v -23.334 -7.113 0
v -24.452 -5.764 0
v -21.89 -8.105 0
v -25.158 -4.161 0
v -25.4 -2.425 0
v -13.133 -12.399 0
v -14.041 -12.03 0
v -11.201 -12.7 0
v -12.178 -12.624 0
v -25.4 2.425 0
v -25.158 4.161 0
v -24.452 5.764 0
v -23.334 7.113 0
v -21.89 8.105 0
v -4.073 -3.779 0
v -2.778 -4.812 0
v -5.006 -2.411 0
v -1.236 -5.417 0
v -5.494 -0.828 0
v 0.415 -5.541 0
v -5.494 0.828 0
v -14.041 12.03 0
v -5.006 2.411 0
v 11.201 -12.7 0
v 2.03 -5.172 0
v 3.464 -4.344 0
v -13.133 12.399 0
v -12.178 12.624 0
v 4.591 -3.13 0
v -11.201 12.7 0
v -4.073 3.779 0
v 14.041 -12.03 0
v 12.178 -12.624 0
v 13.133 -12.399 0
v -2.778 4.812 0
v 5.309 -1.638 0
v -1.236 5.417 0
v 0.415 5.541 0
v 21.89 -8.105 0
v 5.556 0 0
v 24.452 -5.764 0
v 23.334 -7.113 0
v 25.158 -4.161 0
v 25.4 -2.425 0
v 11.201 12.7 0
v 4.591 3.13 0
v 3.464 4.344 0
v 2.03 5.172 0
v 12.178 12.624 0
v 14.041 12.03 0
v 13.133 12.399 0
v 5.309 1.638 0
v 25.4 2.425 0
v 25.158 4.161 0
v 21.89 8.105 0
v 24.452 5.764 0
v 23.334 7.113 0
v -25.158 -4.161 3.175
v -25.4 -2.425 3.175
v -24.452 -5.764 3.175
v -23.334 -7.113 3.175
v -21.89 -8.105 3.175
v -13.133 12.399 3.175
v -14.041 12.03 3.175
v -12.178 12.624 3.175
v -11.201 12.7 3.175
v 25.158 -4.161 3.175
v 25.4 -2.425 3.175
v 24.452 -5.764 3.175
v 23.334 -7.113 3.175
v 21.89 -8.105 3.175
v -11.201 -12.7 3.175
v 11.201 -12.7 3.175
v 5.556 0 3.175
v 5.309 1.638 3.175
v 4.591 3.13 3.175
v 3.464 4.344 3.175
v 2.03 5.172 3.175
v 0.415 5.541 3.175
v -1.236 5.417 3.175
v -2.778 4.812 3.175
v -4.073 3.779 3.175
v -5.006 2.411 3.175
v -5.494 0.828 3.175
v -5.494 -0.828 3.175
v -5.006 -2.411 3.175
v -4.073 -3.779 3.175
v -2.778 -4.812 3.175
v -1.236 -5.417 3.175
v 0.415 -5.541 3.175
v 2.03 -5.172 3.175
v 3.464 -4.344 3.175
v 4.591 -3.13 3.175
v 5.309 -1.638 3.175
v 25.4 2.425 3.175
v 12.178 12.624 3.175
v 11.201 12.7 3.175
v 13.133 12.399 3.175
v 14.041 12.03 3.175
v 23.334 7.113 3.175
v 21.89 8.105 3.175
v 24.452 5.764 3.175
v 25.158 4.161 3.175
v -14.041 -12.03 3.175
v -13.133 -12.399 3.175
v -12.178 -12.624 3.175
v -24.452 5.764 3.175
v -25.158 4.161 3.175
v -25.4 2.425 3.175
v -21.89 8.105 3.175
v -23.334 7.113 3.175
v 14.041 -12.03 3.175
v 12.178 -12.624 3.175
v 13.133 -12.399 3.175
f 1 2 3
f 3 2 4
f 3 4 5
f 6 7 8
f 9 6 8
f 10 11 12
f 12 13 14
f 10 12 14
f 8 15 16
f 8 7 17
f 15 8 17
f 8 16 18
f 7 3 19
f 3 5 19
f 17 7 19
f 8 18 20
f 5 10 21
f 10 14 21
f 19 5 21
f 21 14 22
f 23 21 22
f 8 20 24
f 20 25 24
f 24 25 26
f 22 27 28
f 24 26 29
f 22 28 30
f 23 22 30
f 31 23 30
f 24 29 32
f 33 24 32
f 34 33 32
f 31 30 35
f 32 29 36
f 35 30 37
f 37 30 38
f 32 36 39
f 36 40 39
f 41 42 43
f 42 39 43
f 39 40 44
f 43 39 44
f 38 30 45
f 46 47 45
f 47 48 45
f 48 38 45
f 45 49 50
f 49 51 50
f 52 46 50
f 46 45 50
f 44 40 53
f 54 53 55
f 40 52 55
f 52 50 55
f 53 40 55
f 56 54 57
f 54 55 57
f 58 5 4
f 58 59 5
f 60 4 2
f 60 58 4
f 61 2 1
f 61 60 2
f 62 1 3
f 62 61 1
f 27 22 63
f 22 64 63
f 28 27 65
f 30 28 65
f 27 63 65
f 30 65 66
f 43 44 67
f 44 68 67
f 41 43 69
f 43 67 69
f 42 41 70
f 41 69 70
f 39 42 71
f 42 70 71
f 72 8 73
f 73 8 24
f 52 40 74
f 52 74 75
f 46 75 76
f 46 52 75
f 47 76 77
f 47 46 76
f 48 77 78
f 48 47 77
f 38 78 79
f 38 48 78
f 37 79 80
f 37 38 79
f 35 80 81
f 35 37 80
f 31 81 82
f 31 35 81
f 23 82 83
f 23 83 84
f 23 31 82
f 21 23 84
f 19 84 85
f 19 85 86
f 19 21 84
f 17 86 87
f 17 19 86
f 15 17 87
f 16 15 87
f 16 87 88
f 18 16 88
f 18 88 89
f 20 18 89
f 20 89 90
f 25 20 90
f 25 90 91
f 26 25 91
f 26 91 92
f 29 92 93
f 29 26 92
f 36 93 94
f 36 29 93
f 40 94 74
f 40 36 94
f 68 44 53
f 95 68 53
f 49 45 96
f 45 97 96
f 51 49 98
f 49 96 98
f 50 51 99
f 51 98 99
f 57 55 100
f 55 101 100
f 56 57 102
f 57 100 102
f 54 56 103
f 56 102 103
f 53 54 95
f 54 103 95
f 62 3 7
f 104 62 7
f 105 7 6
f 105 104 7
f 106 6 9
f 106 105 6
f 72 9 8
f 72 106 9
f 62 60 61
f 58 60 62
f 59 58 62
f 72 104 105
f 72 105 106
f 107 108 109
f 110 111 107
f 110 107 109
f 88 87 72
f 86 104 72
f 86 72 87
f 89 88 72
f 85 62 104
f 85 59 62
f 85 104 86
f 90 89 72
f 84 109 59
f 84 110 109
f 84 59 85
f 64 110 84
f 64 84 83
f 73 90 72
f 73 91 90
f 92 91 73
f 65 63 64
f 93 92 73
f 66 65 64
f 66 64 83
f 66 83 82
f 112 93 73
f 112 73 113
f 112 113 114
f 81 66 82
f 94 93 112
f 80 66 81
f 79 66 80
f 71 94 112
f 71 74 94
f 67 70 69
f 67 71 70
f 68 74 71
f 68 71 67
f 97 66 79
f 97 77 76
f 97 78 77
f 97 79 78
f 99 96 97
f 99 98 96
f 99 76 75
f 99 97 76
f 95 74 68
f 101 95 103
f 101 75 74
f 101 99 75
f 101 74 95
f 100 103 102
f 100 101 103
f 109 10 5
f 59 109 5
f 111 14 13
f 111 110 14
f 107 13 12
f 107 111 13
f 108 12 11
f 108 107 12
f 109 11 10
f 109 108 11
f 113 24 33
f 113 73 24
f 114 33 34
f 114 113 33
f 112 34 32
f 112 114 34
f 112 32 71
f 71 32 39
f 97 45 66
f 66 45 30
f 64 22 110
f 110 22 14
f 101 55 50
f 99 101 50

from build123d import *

# Parameters (mm, degrees)
F0_R     = 5.55625
F1_DEPTH = 3.175
F2_R     = 6.35


with BuildPart() as f1:
    # F0 (on Top) → F1 (new body)
    with BuildSketch(Plane.XY):
        Polygon((-12.7, 12.7), (-25.4, 6.35), (-25.4, -6.35), (-12.7, -12.7), (12.7, -12.7), (25.4, -6.35), (25.4, 6.35), (12.7, 12.7), align=None)
        Circle(F0_R, mode=Mode.SUBTRACT)
    extrude(amount=F1_DEPTH)

    # F2
    f2_edges = [f1.edges().sort_by_distance(p)[0] for p in [
        (-12.7, -12.7, 1.5875),
        (12.7, -12.7, 1.5875),
        (25.4, -6.35, 1.5875),
        (25.4, 6.35, 1.5875),
        (12.7, 12.7, 1.5875),
        (-12.7, 12.7, 1.5875),
        (-25.4, 6.35, 1.5875),
        (-25.4, -6.35, 1.5875),
    ]]
    fillet(f2_edges, radius=F2_R)


solid = f1.part
